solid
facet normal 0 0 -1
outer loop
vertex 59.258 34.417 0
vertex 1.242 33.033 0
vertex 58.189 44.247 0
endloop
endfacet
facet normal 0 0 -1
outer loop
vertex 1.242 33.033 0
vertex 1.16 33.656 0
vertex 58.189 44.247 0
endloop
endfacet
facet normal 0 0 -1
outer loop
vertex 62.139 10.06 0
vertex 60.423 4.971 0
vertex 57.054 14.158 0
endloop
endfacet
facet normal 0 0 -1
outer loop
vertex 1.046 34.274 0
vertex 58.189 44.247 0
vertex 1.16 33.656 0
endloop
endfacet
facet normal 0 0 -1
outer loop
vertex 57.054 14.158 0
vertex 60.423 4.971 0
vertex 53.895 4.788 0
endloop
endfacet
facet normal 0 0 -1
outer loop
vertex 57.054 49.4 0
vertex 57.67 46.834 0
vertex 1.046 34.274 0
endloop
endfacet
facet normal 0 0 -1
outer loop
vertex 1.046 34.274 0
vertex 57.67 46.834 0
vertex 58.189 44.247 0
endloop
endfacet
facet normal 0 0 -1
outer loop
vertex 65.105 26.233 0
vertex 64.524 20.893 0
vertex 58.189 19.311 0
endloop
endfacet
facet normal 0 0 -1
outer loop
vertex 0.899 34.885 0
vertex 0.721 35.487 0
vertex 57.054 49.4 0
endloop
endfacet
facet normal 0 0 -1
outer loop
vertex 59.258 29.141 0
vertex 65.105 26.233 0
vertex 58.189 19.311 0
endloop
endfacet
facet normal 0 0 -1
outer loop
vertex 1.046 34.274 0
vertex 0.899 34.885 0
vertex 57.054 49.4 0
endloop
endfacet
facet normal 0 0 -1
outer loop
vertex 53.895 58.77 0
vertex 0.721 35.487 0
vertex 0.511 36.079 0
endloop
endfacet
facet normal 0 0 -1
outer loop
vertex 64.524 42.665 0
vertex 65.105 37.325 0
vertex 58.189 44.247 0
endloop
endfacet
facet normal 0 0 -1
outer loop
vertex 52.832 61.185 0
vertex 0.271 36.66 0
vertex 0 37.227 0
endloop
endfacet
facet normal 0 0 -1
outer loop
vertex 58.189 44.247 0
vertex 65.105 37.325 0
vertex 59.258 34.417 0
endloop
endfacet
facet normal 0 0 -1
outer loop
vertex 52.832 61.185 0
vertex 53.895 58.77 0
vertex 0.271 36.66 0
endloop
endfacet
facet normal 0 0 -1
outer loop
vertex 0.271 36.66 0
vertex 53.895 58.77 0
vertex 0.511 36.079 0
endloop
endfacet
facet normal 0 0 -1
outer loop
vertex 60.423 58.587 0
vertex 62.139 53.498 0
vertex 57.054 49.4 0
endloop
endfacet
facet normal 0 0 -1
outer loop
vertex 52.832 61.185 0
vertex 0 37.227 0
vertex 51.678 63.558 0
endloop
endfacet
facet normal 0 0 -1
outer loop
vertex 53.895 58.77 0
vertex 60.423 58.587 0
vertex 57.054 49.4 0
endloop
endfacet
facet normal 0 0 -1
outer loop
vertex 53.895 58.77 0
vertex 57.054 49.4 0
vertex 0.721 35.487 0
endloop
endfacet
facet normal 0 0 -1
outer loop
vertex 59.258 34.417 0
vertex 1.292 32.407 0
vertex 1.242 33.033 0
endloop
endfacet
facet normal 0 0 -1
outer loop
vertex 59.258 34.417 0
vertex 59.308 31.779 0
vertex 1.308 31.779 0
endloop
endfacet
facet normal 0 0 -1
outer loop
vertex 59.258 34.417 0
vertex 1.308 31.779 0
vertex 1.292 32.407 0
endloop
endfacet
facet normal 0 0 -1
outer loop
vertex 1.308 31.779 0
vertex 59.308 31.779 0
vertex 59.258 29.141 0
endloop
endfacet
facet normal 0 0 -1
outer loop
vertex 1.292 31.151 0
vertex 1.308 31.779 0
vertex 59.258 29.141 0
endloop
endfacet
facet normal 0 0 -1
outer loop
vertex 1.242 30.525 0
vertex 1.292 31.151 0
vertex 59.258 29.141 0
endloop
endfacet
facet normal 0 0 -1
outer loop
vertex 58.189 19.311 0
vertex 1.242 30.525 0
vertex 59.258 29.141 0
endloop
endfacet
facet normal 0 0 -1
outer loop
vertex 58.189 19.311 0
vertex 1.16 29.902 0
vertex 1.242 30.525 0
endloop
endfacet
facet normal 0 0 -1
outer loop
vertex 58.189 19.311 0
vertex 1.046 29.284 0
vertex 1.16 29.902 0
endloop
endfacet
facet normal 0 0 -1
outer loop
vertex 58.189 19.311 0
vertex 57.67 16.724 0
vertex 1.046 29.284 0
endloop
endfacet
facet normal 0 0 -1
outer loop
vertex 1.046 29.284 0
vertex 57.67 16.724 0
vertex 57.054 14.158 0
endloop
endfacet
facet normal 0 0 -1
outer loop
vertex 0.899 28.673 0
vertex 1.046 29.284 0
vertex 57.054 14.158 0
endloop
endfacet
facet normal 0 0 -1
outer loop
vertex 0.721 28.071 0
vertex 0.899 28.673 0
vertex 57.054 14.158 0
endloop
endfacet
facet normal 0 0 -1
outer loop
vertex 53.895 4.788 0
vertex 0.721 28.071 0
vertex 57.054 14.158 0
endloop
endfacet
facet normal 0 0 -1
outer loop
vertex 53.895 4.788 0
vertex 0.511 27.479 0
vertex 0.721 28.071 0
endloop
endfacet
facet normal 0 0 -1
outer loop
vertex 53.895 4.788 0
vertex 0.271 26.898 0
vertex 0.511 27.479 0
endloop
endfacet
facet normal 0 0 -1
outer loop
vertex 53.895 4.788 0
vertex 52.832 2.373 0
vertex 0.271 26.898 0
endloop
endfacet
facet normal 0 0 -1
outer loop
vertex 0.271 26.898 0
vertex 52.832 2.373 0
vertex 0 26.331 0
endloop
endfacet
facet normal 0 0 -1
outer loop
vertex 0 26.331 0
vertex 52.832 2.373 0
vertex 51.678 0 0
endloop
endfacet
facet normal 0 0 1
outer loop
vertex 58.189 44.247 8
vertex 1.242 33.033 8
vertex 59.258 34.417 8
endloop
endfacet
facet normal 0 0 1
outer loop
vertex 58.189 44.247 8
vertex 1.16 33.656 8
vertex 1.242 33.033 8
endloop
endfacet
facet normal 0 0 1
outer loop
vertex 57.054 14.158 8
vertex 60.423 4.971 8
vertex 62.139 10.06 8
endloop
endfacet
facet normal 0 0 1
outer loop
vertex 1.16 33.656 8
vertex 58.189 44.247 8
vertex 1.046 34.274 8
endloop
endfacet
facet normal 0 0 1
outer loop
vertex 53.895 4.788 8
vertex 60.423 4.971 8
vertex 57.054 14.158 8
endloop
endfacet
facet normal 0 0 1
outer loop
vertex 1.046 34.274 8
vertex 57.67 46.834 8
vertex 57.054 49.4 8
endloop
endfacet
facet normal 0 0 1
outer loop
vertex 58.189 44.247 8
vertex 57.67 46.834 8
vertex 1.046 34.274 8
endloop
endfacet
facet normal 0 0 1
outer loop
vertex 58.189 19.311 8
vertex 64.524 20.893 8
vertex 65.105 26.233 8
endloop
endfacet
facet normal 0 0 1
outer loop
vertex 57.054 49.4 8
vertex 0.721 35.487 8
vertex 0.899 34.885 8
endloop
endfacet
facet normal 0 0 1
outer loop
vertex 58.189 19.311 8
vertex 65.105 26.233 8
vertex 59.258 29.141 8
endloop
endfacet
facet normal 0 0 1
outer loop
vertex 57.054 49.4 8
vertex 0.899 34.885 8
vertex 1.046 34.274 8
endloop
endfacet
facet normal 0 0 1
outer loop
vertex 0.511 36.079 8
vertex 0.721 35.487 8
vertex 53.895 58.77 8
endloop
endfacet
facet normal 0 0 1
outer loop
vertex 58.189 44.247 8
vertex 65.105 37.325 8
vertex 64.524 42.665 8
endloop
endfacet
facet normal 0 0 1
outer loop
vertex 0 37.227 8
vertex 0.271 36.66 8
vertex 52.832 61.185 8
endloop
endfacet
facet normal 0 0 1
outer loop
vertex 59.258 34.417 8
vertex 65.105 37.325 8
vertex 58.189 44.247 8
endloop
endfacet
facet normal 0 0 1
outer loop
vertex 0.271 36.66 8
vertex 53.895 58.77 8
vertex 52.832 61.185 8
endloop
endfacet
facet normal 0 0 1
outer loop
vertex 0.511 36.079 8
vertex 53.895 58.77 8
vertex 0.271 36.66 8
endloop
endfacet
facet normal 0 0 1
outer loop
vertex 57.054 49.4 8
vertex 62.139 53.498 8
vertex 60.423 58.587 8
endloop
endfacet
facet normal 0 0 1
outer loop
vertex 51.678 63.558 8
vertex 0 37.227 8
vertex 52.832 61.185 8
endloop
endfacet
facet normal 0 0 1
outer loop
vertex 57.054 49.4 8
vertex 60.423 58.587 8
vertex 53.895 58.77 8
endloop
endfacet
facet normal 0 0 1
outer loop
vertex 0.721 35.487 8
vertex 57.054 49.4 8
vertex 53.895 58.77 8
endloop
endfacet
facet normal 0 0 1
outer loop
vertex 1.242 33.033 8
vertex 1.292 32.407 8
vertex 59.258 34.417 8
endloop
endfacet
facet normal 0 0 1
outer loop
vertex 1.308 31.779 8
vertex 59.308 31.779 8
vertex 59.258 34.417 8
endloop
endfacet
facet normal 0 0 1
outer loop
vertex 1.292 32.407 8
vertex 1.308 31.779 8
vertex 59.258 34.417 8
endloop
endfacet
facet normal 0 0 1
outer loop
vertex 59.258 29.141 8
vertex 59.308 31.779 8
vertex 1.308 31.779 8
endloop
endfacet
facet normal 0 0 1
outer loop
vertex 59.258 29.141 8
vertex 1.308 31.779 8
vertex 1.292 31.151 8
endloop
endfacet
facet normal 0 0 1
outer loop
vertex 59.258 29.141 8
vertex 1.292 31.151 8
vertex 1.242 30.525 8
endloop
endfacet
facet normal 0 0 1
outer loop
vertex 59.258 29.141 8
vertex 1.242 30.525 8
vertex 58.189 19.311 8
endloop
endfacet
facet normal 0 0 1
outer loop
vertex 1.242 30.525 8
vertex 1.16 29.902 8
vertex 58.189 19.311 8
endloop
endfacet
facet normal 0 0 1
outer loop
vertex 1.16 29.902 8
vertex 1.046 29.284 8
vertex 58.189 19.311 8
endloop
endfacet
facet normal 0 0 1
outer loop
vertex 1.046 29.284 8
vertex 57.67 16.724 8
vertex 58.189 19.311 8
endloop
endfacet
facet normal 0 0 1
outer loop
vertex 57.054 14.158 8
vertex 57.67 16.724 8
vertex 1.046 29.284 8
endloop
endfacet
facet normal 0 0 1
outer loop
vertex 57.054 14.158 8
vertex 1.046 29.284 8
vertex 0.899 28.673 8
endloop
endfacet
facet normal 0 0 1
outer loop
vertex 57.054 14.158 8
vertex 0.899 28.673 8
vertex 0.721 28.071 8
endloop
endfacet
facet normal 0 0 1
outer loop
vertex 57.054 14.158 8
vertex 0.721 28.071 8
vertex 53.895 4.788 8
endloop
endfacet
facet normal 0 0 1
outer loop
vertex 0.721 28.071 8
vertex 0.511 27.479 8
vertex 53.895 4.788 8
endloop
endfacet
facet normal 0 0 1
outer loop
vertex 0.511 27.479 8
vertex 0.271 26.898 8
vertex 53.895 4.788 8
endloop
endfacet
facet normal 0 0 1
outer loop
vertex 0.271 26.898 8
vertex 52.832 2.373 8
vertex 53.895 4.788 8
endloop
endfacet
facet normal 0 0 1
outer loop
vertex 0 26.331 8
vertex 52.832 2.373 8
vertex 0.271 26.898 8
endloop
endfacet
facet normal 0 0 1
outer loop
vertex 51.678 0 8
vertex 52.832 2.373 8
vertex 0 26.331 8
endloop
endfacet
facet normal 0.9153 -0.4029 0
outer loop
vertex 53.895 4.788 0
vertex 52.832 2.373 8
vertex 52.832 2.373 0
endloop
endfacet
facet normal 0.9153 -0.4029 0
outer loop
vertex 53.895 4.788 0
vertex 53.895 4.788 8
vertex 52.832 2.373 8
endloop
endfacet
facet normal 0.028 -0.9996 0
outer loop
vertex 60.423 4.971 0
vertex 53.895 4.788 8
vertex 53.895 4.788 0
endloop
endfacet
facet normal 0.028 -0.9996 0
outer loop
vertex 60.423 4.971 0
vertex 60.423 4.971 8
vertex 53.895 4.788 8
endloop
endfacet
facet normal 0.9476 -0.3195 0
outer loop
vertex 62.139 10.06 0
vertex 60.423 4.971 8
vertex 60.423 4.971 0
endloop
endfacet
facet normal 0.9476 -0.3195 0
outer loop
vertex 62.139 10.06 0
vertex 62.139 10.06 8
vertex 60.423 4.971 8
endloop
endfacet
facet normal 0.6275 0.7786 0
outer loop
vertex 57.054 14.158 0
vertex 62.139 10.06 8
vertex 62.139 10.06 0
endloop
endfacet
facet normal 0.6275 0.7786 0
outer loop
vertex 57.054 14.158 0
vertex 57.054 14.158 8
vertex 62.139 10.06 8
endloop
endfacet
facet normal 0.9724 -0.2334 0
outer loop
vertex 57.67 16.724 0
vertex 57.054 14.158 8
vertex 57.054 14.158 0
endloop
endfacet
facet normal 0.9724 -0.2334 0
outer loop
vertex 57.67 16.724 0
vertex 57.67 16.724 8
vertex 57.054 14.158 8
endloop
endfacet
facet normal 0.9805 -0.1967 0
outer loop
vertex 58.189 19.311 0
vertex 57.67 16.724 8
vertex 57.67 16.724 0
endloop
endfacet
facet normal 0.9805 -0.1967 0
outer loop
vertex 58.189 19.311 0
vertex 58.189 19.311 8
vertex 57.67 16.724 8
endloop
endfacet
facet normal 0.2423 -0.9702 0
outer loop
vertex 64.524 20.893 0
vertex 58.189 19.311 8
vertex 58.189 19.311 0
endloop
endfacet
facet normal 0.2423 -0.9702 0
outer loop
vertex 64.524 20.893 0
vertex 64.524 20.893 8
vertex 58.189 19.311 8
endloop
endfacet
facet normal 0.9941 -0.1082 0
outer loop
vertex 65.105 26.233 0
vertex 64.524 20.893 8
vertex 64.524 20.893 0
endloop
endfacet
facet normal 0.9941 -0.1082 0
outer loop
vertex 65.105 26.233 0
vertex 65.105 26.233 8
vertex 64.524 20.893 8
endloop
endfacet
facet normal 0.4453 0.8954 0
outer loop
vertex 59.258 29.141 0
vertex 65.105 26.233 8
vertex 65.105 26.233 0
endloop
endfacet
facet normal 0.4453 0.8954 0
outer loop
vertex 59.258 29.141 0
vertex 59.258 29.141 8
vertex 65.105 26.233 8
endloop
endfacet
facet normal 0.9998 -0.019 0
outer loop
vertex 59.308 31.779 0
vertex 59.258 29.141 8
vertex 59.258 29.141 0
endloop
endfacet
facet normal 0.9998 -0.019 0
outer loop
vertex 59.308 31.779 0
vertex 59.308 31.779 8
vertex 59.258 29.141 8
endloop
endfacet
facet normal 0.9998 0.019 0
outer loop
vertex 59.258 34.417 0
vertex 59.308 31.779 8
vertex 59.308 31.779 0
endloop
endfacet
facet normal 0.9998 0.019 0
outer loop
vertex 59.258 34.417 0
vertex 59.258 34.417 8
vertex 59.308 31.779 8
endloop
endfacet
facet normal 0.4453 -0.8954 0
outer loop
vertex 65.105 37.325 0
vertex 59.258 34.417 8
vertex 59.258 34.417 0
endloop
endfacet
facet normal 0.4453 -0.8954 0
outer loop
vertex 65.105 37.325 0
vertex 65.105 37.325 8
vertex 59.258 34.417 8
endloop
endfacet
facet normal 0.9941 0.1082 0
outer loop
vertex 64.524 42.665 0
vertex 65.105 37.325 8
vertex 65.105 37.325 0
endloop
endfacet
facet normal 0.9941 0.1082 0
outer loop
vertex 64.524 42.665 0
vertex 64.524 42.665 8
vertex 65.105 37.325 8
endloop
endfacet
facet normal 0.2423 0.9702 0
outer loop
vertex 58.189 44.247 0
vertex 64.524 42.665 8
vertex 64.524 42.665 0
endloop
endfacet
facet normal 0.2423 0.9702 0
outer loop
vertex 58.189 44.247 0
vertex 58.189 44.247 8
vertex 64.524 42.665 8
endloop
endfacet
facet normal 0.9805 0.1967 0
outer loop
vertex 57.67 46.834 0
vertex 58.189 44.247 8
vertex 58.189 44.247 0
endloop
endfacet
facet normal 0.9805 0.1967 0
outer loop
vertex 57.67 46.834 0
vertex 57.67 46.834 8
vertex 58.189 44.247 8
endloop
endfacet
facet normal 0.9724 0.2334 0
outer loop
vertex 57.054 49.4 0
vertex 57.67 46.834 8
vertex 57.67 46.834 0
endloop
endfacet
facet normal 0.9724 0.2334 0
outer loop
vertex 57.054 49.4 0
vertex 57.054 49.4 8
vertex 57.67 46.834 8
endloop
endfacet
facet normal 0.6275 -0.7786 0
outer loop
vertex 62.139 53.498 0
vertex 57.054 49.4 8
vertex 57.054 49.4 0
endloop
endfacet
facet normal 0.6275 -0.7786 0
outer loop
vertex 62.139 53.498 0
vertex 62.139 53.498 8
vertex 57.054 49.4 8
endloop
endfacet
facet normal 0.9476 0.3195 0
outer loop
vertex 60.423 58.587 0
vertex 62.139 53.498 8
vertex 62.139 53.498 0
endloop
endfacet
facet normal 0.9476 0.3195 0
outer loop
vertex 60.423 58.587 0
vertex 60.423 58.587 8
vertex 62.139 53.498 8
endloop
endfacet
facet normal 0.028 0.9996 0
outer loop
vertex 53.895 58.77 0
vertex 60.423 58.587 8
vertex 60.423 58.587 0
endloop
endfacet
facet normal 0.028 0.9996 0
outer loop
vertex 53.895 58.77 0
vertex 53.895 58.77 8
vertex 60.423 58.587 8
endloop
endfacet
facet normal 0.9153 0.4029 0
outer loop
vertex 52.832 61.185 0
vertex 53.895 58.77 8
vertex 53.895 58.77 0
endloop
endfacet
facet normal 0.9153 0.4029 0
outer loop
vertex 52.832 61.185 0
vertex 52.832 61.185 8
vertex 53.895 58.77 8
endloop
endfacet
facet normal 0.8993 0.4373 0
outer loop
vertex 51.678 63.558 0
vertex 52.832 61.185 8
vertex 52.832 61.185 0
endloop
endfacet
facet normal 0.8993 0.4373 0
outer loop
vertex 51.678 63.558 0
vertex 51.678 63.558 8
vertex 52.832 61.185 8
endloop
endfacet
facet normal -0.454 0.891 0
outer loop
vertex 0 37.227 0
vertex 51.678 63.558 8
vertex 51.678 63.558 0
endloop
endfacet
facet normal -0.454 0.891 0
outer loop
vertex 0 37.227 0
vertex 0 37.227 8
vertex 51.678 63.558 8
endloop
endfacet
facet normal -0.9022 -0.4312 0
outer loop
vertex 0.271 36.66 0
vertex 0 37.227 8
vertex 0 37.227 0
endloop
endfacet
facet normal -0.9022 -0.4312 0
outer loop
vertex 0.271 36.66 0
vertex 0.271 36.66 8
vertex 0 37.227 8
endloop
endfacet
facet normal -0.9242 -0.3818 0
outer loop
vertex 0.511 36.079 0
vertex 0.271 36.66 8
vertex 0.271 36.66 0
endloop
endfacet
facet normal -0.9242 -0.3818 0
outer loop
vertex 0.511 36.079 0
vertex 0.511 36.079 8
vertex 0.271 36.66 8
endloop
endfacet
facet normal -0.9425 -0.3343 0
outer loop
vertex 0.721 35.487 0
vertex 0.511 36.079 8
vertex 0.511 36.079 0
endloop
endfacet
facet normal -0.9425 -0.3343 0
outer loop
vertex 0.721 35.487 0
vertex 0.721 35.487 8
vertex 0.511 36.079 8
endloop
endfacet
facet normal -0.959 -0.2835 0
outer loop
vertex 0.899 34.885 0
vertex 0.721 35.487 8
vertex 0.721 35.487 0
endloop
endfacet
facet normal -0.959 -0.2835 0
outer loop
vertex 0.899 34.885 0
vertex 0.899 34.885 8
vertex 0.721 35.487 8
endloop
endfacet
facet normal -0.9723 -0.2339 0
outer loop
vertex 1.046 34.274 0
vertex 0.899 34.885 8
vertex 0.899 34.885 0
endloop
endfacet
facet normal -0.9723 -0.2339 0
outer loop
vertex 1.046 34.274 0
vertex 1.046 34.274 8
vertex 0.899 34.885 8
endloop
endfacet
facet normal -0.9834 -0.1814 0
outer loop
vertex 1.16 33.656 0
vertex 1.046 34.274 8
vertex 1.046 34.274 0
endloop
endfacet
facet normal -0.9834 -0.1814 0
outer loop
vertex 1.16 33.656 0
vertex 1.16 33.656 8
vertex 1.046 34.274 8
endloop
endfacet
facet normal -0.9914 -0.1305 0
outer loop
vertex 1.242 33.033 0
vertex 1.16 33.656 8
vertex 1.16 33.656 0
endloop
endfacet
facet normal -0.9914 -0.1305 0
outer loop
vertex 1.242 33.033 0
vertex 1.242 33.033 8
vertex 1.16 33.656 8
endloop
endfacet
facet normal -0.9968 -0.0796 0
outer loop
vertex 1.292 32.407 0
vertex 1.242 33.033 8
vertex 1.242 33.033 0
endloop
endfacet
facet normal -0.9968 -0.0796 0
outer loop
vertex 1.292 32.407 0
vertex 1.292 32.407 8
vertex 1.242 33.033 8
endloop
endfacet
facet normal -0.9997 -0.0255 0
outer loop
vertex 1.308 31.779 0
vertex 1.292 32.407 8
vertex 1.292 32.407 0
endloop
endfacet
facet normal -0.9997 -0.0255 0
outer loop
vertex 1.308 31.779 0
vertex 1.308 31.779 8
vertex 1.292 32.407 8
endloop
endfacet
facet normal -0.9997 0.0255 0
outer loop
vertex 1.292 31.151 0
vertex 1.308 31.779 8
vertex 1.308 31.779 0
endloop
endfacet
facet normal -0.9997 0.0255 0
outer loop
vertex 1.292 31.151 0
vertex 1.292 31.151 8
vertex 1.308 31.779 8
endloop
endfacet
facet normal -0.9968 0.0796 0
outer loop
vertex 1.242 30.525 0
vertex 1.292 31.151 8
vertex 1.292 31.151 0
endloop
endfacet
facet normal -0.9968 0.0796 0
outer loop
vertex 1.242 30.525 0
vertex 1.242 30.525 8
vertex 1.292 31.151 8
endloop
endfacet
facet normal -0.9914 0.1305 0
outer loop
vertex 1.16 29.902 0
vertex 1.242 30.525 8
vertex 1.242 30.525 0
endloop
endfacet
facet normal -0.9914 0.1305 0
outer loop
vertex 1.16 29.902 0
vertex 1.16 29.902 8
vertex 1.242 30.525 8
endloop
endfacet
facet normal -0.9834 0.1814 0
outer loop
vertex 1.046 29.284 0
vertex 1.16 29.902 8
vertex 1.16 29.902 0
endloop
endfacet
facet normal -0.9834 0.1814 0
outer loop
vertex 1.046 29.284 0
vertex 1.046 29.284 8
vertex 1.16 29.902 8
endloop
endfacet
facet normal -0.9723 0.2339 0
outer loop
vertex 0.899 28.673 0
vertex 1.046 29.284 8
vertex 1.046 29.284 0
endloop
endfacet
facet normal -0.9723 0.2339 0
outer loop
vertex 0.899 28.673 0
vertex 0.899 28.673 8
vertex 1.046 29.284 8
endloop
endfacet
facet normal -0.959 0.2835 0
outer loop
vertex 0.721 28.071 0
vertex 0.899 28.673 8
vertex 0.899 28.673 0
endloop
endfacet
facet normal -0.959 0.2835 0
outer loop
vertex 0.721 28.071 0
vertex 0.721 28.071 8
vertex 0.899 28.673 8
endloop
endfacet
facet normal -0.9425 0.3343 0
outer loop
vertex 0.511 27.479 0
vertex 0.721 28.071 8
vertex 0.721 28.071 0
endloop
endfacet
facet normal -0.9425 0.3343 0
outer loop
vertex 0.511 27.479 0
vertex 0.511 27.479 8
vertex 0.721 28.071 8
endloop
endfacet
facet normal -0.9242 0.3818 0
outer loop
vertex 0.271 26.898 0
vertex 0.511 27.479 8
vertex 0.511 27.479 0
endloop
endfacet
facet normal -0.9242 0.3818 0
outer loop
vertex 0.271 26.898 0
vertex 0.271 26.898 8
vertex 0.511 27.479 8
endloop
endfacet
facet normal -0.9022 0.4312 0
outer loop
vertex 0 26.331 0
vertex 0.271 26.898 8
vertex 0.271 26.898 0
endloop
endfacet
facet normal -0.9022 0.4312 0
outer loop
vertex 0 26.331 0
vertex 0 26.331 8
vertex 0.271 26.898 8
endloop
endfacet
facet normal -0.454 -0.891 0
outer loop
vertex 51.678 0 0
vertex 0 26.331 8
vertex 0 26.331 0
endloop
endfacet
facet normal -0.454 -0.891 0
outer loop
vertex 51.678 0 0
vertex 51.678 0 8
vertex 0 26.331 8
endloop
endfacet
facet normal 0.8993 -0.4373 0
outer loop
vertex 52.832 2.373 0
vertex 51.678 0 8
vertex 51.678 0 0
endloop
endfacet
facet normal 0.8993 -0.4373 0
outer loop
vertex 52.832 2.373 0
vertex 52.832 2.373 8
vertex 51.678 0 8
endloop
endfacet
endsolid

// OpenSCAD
$fn = 32;

// ----------------------------------------------------------------------
// Gear sector: 4 teeth on 54 degrees
// ----------------------------------------------------------------------

// --- parameters (mm) ---
sector_angle = 54;        // sector angle, degrees
root_r = 70;              // root circle radius
tooth_h = 6;              // tooth height over the root circle
teeth = 4;                // number of teeth on the sector
hub_r = 12;               // hub bore radius
plate_t = 8;              // sector thickness, Z
arc_step = 3;             // sampling step of the root/hub arcs, degrees

tip_r = root_r + tooth_h;  // tip circle radius

profile = [[51.678, 0], [52.832, 2.373], [53.895, 4.788], [60.423, 4.971], [62.139, 10.06], [57.054, 14.158], [57.67, 16.724], [58.189, 19.311], [64.524, 20.893], [65.105, 26.233], [59.258, 29.141], [59.308, 31.779], [59.258, 34.417], [65.105, 37.325], [64.524, 42.665], [58.189, 44.247], [57.67, 46.834], [57.054, 49.4], [62.139, 53.498], [60.423, 58.587], [53.895, 58.77], [52.832, 61.185], [51.678, 63.558], [0, 37.227], [0.271, 36.66], [0.511, 36.079], [0.721, 35.487], [0.899, 34.885], [1.046, 34.274], [1.16, 33.656], [1.242, 33.033], [1.292, 32.407], [1.308, 31.779], [1.292, 31.151], [1.242, 30.525], [1.16, 29.902], [1.046, 29.284], [0.899, 28.673], [0.721, 28.071], [0.511, 27.479], [0.271, 26.898], [0, 26.331]];  // primary outline, 42 points, counter clockwise

// --- the one profile operation ---
linear_extrude(height = plate_t) polygon(points = profile);
